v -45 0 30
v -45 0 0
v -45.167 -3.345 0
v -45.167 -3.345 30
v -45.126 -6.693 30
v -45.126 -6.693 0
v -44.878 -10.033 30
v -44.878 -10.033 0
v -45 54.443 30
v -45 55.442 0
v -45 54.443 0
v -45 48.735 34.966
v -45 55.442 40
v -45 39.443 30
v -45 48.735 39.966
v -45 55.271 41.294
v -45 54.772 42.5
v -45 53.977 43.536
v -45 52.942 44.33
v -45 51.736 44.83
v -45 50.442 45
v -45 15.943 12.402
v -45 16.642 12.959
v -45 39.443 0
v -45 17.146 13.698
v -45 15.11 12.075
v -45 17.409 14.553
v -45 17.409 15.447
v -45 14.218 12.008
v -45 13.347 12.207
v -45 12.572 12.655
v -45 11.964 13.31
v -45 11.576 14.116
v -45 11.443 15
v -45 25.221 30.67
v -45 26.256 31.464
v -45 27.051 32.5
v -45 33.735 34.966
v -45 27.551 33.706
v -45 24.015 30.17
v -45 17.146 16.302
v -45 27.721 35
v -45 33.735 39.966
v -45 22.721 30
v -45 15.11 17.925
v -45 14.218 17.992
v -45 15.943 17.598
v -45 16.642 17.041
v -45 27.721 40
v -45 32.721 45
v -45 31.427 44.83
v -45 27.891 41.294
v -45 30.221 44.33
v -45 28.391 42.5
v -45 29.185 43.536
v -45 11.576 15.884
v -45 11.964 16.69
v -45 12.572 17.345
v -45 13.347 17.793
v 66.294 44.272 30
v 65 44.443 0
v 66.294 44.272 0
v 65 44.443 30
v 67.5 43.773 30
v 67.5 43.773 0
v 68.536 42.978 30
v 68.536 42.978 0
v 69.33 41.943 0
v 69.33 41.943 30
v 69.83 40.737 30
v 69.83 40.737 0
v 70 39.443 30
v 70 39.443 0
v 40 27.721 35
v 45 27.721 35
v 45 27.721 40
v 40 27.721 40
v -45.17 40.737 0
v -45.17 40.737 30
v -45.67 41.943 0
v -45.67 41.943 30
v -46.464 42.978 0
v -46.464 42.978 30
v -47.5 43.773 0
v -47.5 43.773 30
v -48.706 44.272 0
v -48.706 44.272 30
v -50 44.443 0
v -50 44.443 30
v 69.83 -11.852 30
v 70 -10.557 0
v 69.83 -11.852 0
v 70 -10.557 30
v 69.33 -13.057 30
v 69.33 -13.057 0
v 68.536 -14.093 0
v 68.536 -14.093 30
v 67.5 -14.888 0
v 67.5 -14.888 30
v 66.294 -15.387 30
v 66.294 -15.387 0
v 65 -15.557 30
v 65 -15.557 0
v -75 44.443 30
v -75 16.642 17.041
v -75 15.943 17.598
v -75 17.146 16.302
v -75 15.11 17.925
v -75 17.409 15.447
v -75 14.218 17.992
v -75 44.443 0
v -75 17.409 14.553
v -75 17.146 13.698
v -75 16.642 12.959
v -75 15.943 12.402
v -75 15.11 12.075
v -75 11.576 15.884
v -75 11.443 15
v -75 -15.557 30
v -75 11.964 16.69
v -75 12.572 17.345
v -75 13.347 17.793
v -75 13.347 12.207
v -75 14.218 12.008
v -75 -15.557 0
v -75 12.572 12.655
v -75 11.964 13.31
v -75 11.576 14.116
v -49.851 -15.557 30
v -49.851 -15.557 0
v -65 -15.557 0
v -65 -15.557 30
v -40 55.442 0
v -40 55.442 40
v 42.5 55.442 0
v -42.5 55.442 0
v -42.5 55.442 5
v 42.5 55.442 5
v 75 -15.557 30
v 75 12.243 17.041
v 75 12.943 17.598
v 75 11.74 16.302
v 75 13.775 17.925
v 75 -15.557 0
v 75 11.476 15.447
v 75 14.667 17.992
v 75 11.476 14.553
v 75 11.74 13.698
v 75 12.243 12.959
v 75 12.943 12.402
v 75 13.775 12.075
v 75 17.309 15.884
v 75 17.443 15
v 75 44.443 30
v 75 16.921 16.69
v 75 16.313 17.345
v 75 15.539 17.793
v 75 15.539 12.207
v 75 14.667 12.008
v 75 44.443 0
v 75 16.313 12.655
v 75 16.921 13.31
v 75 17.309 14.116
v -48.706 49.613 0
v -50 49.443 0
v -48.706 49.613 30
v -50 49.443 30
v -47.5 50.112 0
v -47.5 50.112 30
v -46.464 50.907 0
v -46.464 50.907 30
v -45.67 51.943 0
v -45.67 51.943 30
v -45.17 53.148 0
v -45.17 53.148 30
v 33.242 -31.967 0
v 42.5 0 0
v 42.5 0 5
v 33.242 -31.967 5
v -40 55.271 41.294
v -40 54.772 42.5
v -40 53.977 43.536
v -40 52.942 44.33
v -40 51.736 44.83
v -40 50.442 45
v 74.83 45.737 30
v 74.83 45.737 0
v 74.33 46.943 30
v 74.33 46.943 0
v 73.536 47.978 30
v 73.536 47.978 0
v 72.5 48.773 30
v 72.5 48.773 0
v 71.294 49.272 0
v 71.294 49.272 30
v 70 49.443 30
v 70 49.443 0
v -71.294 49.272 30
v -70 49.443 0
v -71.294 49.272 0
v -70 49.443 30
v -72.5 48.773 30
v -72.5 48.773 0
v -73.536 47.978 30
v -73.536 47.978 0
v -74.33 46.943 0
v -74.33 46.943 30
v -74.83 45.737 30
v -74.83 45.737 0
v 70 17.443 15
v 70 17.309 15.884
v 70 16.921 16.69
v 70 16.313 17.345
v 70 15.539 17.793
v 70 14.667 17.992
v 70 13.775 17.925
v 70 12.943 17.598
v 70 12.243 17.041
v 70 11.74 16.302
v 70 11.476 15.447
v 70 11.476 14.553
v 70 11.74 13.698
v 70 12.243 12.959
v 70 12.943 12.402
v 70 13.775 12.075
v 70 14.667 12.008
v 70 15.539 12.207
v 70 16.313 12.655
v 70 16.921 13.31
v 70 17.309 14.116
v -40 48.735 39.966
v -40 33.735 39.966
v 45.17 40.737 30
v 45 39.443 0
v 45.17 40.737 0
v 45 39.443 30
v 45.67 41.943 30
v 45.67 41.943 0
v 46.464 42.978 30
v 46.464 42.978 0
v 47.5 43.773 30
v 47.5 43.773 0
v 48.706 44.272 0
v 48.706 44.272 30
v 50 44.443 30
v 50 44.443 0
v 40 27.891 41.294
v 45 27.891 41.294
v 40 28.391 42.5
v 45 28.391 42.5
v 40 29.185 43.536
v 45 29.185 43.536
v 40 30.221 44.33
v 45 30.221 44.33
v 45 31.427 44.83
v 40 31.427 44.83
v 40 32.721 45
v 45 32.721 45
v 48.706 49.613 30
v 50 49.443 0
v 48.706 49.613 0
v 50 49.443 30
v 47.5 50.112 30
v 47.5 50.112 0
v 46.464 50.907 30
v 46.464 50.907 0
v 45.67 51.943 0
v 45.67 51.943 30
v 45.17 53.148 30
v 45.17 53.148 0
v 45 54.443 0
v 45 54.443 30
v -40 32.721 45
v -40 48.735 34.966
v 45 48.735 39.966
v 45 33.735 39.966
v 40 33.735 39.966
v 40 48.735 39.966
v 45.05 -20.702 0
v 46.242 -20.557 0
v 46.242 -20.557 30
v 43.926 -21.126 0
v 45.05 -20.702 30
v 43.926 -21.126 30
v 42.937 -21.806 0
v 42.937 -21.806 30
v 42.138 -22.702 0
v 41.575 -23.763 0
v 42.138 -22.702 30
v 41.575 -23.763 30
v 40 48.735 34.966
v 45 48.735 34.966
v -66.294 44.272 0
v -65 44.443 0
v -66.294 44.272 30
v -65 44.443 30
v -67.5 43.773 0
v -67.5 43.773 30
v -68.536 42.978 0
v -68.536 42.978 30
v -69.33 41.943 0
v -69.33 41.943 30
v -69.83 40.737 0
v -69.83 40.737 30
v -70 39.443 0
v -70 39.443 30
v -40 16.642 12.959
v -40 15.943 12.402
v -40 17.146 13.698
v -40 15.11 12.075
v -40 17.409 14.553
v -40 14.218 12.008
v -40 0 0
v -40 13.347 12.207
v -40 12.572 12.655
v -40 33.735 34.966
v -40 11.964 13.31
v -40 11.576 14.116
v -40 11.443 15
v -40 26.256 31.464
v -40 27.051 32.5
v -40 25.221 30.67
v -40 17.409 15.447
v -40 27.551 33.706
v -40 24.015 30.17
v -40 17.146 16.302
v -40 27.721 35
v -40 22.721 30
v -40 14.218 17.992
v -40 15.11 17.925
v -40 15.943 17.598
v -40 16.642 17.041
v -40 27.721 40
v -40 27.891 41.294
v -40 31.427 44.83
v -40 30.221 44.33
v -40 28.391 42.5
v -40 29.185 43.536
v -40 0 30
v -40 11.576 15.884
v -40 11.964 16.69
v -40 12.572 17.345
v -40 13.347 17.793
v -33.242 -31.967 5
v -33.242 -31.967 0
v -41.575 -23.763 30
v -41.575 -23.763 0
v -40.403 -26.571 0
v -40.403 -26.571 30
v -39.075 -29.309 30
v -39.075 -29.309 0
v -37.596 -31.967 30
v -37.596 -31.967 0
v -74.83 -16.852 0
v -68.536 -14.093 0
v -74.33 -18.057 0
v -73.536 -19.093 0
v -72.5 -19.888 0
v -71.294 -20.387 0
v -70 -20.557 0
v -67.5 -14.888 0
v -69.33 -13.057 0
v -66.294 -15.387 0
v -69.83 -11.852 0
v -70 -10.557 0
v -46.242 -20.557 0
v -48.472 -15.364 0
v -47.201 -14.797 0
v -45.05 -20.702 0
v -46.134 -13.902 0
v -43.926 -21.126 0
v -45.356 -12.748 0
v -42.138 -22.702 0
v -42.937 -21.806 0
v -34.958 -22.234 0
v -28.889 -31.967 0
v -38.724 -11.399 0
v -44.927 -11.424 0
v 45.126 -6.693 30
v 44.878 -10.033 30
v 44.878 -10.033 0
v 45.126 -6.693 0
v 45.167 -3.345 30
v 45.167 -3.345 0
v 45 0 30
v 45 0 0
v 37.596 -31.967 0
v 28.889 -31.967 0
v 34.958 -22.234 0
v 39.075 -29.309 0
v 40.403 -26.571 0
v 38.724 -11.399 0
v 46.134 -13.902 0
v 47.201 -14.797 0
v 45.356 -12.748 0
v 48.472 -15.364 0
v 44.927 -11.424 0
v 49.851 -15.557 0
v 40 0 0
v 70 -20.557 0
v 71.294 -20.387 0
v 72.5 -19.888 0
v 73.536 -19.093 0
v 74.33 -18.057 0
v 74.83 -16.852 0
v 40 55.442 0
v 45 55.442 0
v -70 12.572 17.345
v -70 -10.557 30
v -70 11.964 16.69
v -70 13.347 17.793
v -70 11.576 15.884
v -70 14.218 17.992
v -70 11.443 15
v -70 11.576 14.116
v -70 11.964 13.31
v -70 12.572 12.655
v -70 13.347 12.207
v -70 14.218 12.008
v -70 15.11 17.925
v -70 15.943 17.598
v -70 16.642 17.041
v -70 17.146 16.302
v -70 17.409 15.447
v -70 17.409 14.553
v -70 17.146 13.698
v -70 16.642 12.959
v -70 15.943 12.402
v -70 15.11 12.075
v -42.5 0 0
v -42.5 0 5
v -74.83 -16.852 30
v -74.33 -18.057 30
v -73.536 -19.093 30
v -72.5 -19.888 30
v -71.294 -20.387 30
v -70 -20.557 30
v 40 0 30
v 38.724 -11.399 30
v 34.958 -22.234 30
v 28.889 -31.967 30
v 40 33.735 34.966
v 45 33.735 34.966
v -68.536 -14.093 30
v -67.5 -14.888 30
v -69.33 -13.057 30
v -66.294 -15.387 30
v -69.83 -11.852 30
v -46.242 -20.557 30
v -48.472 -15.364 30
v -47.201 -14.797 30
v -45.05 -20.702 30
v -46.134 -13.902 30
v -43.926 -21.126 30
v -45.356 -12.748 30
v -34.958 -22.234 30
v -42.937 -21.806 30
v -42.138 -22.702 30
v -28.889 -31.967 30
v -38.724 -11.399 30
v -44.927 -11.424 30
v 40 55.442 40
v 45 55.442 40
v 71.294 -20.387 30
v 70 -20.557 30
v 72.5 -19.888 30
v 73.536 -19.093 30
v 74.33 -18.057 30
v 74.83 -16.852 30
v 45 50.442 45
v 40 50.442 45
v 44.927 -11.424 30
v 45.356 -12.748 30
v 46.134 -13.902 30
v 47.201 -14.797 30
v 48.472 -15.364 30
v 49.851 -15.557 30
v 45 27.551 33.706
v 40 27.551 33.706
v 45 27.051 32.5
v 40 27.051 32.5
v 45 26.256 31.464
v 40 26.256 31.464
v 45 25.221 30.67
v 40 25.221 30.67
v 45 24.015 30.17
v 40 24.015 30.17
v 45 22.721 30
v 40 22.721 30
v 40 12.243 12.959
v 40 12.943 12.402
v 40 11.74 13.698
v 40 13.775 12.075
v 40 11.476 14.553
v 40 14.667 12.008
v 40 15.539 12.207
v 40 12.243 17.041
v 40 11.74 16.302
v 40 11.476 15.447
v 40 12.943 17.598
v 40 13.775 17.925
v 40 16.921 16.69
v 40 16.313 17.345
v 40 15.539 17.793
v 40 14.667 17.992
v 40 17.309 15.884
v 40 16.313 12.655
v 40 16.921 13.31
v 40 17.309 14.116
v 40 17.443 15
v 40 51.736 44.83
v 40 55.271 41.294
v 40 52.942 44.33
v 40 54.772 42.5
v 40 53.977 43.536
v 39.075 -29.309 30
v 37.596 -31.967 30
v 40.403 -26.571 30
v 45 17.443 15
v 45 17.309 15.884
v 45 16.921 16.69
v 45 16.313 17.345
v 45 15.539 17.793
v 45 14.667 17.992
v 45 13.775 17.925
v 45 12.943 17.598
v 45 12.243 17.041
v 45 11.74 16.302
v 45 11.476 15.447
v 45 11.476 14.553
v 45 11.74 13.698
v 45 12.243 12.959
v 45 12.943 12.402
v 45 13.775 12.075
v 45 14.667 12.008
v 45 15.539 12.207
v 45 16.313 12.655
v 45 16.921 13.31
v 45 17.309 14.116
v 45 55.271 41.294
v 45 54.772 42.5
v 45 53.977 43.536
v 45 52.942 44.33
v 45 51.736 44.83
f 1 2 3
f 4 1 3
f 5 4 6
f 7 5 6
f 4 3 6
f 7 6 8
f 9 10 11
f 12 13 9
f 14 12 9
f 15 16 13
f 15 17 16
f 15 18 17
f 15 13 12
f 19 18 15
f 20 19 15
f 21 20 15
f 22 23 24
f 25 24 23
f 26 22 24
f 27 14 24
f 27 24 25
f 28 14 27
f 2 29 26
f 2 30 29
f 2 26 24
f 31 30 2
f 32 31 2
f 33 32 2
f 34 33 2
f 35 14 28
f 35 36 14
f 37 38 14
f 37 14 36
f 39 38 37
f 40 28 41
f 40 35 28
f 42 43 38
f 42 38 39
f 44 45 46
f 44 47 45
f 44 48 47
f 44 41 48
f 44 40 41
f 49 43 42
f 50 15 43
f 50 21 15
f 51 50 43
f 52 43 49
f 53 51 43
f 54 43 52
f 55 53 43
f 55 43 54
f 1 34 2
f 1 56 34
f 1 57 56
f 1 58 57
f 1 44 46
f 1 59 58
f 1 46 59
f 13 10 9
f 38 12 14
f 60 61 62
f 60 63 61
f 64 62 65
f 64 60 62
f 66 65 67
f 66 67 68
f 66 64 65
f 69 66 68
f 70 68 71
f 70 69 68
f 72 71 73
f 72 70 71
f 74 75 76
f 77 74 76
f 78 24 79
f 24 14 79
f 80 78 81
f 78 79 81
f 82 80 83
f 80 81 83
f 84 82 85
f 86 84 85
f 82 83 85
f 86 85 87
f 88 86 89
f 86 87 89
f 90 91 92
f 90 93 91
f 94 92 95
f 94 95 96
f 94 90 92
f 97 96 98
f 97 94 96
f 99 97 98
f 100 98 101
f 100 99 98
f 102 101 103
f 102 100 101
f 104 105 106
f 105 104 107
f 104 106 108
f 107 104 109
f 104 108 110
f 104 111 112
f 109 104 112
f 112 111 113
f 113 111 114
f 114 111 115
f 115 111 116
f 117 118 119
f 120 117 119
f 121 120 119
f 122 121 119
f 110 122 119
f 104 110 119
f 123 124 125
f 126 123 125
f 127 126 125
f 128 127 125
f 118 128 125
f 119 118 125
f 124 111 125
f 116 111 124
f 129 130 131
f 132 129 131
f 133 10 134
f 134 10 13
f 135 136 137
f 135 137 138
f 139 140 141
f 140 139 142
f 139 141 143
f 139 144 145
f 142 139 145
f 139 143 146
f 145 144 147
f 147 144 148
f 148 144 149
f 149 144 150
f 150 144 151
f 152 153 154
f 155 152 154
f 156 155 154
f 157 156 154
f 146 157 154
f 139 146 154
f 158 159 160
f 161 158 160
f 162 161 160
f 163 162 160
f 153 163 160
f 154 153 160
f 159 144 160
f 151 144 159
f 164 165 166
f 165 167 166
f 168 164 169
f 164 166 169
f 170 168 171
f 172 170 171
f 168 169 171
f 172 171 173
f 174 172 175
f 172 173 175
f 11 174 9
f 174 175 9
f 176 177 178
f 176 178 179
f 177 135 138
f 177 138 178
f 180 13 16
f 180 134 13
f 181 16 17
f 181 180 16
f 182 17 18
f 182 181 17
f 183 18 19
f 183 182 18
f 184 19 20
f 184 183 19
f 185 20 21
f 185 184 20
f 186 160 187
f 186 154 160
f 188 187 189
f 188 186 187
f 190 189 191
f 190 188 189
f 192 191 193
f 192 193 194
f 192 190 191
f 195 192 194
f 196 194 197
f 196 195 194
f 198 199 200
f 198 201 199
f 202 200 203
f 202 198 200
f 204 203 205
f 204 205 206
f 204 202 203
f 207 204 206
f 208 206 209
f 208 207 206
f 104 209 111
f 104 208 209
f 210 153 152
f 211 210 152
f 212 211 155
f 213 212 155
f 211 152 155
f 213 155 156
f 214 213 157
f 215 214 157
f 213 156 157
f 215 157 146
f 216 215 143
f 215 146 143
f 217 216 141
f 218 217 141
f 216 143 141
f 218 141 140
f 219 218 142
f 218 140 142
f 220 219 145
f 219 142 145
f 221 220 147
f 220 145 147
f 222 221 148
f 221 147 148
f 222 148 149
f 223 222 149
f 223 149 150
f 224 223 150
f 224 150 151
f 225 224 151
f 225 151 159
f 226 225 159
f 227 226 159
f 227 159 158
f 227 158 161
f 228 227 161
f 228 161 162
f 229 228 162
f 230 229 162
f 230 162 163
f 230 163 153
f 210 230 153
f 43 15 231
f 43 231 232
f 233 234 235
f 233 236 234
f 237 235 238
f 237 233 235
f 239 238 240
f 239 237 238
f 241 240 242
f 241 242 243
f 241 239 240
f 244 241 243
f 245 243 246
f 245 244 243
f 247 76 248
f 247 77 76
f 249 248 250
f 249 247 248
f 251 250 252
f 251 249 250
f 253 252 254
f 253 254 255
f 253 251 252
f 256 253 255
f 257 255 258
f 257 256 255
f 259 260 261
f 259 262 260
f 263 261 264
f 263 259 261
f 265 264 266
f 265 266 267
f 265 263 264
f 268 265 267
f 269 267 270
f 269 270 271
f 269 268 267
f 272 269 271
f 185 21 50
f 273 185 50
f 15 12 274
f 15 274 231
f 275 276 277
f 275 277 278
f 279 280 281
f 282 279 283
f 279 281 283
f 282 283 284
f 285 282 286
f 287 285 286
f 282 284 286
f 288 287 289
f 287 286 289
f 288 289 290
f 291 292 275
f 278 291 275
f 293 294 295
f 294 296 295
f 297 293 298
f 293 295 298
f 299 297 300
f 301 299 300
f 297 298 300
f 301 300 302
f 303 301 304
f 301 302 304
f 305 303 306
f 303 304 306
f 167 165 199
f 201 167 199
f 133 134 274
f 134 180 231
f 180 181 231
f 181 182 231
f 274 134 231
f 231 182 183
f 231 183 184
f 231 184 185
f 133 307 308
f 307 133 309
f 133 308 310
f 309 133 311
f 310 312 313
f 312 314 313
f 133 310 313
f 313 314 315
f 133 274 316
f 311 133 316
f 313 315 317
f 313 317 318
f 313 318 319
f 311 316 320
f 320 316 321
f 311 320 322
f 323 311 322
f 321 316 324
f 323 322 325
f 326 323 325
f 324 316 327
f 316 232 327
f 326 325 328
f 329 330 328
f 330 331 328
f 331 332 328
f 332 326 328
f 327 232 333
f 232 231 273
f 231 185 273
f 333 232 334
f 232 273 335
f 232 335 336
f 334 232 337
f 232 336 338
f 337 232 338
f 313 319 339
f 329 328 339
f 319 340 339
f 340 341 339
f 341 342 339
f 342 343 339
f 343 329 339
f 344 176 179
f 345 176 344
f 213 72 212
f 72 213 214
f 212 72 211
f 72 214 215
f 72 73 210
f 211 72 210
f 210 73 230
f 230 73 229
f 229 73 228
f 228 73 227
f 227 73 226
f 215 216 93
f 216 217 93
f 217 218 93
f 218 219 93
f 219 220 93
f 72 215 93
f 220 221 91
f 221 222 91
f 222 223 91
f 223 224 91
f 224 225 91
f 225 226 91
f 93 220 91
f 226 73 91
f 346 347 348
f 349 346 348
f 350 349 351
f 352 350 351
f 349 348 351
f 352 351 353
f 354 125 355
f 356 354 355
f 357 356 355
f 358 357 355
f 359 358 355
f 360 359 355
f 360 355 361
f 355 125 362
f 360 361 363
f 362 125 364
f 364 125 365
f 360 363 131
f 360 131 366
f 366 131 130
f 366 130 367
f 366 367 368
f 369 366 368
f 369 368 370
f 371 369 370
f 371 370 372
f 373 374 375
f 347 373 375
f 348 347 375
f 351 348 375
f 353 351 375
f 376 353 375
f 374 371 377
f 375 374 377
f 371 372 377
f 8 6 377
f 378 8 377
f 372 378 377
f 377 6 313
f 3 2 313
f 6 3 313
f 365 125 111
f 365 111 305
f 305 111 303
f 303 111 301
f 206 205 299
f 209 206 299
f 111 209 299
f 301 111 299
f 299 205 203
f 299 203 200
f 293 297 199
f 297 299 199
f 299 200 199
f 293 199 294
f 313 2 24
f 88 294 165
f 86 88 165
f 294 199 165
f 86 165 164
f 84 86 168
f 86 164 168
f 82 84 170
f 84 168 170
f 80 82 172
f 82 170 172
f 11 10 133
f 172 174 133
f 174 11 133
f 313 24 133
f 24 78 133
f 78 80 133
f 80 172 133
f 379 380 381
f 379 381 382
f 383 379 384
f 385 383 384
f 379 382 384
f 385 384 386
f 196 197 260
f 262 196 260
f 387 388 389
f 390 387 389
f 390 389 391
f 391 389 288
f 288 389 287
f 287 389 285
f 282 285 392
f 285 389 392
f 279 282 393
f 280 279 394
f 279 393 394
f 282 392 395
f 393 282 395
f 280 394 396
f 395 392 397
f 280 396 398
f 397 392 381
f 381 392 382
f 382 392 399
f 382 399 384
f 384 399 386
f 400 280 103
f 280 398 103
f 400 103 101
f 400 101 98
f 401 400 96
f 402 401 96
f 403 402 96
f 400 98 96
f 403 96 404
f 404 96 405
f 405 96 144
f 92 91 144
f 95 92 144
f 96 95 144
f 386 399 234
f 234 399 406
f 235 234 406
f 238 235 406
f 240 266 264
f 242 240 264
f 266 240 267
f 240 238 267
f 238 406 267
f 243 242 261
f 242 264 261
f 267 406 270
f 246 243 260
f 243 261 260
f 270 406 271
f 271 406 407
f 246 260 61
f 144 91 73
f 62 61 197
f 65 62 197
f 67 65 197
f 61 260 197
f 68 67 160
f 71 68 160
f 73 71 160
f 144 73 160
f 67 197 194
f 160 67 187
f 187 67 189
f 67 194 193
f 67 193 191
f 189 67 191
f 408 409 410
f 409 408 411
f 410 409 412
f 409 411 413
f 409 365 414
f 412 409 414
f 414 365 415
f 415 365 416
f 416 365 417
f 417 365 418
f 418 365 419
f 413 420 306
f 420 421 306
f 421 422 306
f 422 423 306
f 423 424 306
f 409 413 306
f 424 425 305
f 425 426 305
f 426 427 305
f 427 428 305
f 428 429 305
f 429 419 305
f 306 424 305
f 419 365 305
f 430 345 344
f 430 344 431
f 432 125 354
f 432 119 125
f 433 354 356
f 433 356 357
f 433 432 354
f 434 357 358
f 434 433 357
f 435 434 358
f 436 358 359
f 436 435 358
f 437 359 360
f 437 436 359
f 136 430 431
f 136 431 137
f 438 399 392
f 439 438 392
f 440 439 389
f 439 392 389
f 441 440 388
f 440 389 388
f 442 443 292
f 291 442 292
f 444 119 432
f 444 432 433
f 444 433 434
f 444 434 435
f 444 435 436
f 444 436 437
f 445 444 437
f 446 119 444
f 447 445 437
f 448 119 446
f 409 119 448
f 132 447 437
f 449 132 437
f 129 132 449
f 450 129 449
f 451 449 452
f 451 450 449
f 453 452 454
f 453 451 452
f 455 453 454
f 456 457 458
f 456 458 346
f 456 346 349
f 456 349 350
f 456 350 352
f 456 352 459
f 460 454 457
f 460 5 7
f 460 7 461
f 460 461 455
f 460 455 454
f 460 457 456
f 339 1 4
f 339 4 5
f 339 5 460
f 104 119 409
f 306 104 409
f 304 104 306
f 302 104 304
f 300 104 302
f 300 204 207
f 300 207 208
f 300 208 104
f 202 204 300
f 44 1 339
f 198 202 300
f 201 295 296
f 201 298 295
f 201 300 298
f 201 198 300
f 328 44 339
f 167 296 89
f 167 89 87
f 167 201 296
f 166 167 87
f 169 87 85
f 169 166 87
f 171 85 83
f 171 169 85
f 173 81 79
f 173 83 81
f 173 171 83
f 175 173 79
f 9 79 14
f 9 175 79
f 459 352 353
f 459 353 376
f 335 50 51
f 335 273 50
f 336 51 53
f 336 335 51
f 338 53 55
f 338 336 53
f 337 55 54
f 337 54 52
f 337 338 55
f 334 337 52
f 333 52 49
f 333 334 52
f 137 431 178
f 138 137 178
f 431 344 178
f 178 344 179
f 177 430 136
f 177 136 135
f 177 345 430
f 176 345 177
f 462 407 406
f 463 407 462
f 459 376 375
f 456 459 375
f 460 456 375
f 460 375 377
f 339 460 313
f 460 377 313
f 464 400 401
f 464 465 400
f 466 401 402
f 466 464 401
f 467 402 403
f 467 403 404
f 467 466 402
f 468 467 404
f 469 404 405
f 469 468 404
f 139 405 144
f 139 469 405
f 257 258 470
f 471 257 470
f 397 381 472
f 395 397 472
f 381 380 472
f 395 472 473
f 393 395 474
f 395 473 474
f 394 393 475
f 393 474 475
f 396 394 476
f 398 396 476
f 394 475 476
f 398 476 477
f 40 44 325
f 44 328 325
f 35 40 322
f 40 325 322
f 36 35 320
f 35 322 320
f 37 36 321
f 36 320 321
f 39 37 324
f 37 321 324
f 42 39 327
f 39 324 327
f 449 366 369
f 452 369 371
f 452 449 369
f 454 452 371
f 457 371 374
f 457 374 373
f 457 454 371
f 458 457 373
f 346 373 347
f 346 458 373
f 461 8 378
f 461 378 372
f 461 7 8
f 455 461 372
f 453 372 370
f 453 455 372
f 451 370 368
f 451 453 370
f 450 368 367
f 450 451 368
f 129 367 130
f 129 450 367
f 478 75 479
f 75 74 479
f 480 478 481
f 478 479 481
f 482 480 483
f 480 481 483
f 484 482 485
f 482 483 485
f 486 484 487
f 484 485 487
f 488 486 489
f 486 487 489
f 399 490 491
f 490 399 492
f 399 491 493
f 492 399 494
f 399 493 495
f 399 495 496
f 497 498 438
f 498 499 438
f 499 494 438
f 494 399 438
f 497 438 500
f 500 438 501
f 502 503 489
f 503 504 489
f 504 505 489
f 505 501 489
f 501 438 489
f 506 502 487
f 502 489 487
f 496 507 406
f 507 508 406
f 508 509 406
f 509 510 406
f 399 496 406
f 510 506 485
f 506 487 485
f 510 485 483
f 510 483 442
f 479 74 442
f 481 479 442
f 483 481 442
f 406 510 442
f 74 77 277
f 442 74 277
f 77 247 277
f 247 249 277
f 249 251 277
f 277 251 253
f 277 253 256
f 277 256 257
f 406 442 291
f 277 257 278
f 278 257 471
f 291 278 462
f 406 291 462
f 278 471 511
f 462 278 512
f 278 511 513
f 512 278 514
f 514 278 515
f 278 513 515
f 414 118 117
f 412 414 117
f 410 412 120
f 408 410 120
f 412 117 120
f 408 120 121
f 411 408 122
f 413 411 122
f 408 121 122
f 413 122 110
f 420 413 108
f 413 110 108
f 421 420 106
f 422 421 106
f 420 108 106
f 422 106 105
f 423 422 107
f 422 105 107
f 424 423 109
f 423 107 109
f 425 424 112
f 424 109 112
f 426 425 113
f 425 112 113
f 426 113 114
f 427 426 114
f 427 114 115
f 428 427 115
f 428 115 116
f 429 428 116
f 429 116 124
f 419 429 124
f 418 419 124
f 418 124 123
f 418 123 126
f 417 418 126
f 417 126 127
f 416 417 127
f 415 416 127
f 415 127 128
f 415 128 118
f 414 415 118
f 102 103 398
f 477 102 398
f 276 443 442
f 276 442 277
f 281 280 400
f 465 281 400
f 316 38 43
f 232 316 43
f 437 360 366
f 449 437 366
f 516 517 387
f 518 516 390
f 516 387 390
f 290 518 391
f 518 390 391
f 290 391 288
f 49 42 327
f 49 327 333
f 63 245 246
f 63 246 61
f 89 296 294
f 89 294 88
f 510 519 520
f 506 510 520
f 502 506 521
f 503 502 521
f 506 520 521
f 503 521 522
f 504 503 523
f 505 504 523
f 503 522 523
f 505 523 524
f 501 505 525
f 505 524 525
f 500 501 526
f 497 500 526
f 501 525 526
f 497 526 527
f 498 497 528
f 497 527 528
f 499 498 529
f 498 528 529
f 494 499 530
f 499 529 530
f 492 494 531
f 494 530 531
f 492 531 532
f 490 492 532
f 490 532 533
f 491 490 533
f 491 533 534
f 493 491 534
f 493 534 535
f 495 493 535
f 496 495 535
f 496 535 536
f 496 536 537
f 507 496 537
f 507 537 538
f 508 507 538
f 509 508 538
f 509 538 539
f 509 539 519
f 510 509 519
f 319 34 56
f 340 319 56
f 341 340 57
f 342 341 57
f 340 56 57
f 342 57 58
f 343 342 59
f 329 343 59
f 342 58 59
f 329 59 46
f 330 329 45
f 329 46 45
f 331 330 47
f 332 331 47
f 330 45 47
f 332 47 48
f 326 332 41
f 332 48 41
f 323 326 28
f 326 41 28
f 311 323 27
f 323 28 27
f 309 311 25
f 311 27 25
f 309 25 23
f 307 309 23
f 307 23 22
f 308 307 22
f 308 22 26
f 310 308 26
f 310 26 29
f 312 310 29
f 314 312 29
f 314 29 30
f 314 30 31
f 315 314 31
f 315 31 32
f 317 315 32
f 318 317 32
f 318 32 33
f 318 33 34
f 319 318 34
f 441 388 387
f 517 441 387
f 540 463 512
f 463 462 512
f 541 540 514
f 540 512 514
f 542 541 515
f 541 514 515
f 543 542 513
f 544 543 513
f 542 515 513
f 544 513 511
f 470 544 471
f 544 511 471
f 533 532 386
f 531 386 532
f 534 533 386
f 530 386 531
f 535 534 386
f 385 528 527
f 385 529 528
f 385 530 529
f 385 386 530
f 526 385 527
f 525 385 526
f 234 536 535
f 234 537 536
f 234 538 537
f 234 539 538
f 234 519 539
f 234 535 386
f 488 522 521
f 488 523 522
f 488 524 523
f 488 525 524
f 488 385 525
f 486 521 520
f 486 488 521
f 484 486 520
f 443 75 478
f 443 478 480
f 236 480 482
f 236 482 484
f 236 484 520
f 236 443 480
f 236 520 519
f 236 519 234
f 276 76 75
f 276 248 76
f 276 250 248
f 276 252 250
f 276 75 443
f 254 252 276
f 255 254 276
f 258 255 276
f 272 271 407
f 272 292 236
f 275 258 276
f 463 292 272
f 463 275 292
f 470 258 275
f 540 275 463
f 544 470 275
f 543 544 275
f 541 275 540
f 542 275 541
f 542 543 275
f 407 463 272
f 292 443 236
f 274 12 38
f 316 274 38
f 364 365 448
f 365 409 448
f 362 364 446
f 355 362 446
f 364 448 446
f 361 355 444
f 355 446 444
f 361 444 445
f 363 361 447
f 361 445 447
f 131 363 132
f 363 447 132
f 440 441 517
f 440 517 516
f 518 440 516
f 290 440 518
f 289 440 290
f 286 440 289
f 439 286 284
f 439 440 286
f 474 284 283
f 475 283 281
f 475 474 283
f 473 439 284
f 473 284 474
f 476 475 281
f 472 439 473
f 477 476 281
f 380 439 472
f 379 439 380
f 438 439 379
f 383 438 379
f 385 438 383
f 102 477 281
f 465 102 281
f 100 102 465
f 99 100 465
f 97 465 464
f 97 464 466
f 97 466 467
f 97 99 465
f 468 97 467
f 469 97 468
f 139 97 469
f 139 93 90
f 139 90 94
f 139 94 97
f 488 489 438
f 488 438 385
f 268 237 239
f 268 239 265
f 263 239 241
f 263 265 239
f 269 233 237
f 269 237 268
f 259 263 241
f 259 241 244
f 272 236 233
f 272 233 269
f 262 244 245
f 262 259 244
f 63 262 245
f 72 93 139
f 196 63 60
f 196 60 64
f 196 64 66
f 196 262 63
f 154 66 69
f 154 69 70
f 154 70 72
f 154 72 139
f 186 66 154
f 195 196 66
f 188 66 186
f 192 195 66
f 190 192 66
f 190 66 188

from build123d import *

# Parameters (mm, degrees)
F1_DEPTH  = 30
F3_DEPTH  = 5
F4_R      = 3
F5_DEPTH  = 35
F6_R      = 3
F7_DEPTH  = 35
F9_W      = 27.7209319142
F9_H      = 15
F9_W_2    = 15
F9_H_2    = 5
F10_DEPTH = 5
F11_R     = 5
F12_R     = 5
F13_R     = 5
F13_2_R   = 5
F14_R     = 5
F15_W     = 27.7209319142
F15_H     = 15
F15_W_2   = 15
F15_H_2   = 5
F16_DEPTH = 5
F17_R     = 5


with BuildPart() as f1:
    # F0 (on Top) → F1 (new body)
    with BuildSketch(Plane.XY):
        with BuildLine():
            Line((-45, 44.4425949542), (-45, 0))
            ThreePointArc((-45, 0), (-45.066266446, -7.8147796829), (-44.0046991035, -15.5574050458))
            ThreePointArc((-44.0046991035, -15.5574050458), (-43.4089049923, -18.0730910814), (-42.6934813561, -20.5574050458))
            ThreePointArc((-42.6934813561, -20.5574050458), (-40.475443237, -26.4101305765), (-37.5955815851, -31.9671519101))
            Line((-37.5955815851, -31.9671519101), (-28.8889932035, -31.9671519101))
            ThreePointArc((-28.8889932035, -31.9671519101), (-37.1430686541, -16.9215341597), (-40, 0))
            Line((-40, 0), (-40, 55.4418638284))
            Line((-40, 55.4418638284), (-45, 55.4418638284))
            Line((-45, 55.4418638284), (-45, 49.4425949542))
            Line((-45, 49.4425949542), (-45, 44.4425949542))
        make_face()
        with BuildLine():
            ThreePointArc((-42.6934813561, -20.5574050458), (-43.4089049923, -18.0730910814), (-44.0046991035, -15.5574050458))
            Line((-44.0046991035, -15.5574050458), (-70, -15.5574050458))
            Line((-70, -15.5574050458), (-70, 44.4425949542))
            Line((-70, 44.4425949542), (-45, 44.4425949542))
            Line((-45, 44.4425949542), (-45, 49.4425949542))
            Line((-45, 49.4425949542), (-75, 49.4425949542))
            Line((-75, 49.4425949542), (-75, -20.5574050458))
            Line((-75, -20.5574050458), (-42.6934813561, -20.5574050458))
        make_face()
    extrude(amount=F1_DEPTH)

    # F6 (on face) → F7 (cut)
    with BuildSketch(Plane(origin=(-75, 0, 0), x_dir=(0, -1, 0), z_dir=(-1, 0, 0))):
        with Locations((-14.4425949542, 15)):
            Circle(F6_R)
    extrude(amount=-F7_DEPTH, mode=Mode.SUBTRACT)

    # F9 (on face) → F10 (join)
    with BuildSketch(Plane(origin=(-45, 0, 0), x_dir=(0, -1, 0), z_dir=(-1, 0, 0))):
        with Locations((-41.5813978713, 37.5)):
            Rectangle(F9_W, F9_H)
        with Locations((-41.235268414, 37.4656194448)):
            Rectangle(F9_W_2, F9_H_2, mode=Mode.SUBTRACT)
    extrude(amount=-F10_DEPTH)

    # F11
    f11_edges = [f1.edges().sort_by_distance(p)[0] for p in [
        (-75, 49.442595, 15),
        (-75, -20.557405, 15),
    ]]
    fillet(f11_edges, radius=F11_R)

    # F13
    f13_edges = [f1.edges().sort_by_distance(p)[0] for p in [
        (-70, 44.442595, 15),
        (-70, -15.557405, 15),
        (-45, 44.442595, 15),
        (-44.004699, -15.557405, 15),
        (-42.693481, -20.557405, 15),
        (-45, 49.442595, 15),
        (-42.5, 27.720932, 30),
    ]]
    fillet(f13_edges, radius=F13_R)

    # F14
    f14_edges = [f1.edges().sort_by_distance(p)[0] for p in [
        (-42.5, 55.441864, 45),
        (-42.5, 27.720932, 45),
    ]]
    fillet(f14_edges, radius=F14_R)


with BuildPart() as f1b:
    # F0 (on Top) → F1, piece 2 (new body)
    with BuildSketch(Plane.XY):
        with BuildLine():
            ThreePointArc((44.0046991035, -15.5574050458), (45.066266446, -7.8147796829), (45, 0))
            Line((45, 0), (45, 44.4425949542))
            Line((45, 44.4425949542), (45, 49.4425949542))
            Line((45, 49.4425949542), (45, 55.4418638284))
            Line((45, 55.4418638284), (40, 55.4418638284))
            Line((40, 55.4418638284), (40, 0))
            ThreePointArc((40, 0), (37.1430686541, -16.9215341597), (28.8889932035, -31.9671519101))
            Line((28.8889932035, -31.9671519101), (37.5955815851, -31.9671519101))
            ThreePointArc((37.5955815851, -31.9671519101), (40.475443237, -26.4101305765), (42.6934813561, -20.5574050458))
            ThreePointArc((42.6934813561, -20.5574050458), (43.4089049923, -18.0730910814), (44.0046991035, -15.5574050458))
        make_face()
        with BuildLine():
            Line((45, 49.4425949542), (45, 44.4425949542))
            Line((45, 44.4425949542), (70, 44.4425949542))
            Line((70, 44.4425949542), (70, -15.5574050458))
            Line((70, -15.5574050458), (44.0046991035, -15.5574050458))
            ThreePointArc((44.0046991035, -15.5574050458), (43.4089049923, -18.0730910814), (42.6934813561, -20.5574050458))
            Line((42.6934813561, -20.5574050458), (75, -20.5574050458))
            Line((75, -20.5574050458), (75, 49.4425949542))
            Line((75, 49.4425949542), (45, 49.4425949542))
        make_face()
    extrude(amount=F1_DEPTH)

    # F4 (on face) → F5 (cut)
    with BuildSketch(Plane.YZ.offset(75)):
        with Locations((14.4425949542, 15)):
            Circle(F4_R)
    extrude(amount=-F5_DEPTH, mode=Mode.SUBTRACT)

    # F12
    f12_edges = [f1b.edges().sort_by_distance(p)[0] for p in [
        (75, -20.557405, 15),
        (75, 49.442595, 15),
    ]]
    fillet(f12_edges, radius=F12_R)

    # F13#2
    f13_2_edges = [f1b.edges().sort_by_distance(p)[0] for p in [
        (70, 44.442595, 15),
        (70, -15.557405, 15),
        (45, 44.442595, 15),
        (44.004699, -15.557405, 15),
        (42.693481, -20.557405, 15),
        (45, 49.442595, 15),
    ]]
    fillet(f13_2_edges, radius=F13_2_R)

    # F15 (on face) → F16 (join)
    with BuildSketch(Plane.YZ.offset(45)):
        with Locations((41.5813978713, 37.5)):
            Rectangle(F15_W, F15_H)
        with Locations((41.235268414, 37.4656194448)):
            Rectangle(F15_W_2, F15_H_2, mode=Mode.SUBTRACT)
    extrude(amount=-F16_DEPTH)

    # F17
    f17_edges = [f1b.edges().sort_by_distance(p)[0] for p in [
        (42.5, 55.441864, 45),
        (42.5, 27.720932, 45),
        (42.5, 27.720932, 30),
    ]]
    fillet(f17_edges, radius=F17_R)


with BuildPart() as f3:
    # F2 (on face) → F3 (new body)
    with BuildSketch(Plane(origin=(0, 0, 0), x_dir=(1, 0, 0), z_dir=(0, 0, -1))):
        Polygon((-42.5, 0), (-42.5, -55.4418638284), (0, -55.4418638284), (0, 31.9671519101), (-33.2422873943, 31.9671519101), align=None)
        Polygon((0, 31.9671519101), (0, -55.4418638284), (42.5, -55.4418638284), (42.5, 0), (33.2422873943, 31.9671519101), align=None)
    extrude(amount=-F3_DEPTH)


solid = Compound([f1.part, f1b.part, f3.part])
